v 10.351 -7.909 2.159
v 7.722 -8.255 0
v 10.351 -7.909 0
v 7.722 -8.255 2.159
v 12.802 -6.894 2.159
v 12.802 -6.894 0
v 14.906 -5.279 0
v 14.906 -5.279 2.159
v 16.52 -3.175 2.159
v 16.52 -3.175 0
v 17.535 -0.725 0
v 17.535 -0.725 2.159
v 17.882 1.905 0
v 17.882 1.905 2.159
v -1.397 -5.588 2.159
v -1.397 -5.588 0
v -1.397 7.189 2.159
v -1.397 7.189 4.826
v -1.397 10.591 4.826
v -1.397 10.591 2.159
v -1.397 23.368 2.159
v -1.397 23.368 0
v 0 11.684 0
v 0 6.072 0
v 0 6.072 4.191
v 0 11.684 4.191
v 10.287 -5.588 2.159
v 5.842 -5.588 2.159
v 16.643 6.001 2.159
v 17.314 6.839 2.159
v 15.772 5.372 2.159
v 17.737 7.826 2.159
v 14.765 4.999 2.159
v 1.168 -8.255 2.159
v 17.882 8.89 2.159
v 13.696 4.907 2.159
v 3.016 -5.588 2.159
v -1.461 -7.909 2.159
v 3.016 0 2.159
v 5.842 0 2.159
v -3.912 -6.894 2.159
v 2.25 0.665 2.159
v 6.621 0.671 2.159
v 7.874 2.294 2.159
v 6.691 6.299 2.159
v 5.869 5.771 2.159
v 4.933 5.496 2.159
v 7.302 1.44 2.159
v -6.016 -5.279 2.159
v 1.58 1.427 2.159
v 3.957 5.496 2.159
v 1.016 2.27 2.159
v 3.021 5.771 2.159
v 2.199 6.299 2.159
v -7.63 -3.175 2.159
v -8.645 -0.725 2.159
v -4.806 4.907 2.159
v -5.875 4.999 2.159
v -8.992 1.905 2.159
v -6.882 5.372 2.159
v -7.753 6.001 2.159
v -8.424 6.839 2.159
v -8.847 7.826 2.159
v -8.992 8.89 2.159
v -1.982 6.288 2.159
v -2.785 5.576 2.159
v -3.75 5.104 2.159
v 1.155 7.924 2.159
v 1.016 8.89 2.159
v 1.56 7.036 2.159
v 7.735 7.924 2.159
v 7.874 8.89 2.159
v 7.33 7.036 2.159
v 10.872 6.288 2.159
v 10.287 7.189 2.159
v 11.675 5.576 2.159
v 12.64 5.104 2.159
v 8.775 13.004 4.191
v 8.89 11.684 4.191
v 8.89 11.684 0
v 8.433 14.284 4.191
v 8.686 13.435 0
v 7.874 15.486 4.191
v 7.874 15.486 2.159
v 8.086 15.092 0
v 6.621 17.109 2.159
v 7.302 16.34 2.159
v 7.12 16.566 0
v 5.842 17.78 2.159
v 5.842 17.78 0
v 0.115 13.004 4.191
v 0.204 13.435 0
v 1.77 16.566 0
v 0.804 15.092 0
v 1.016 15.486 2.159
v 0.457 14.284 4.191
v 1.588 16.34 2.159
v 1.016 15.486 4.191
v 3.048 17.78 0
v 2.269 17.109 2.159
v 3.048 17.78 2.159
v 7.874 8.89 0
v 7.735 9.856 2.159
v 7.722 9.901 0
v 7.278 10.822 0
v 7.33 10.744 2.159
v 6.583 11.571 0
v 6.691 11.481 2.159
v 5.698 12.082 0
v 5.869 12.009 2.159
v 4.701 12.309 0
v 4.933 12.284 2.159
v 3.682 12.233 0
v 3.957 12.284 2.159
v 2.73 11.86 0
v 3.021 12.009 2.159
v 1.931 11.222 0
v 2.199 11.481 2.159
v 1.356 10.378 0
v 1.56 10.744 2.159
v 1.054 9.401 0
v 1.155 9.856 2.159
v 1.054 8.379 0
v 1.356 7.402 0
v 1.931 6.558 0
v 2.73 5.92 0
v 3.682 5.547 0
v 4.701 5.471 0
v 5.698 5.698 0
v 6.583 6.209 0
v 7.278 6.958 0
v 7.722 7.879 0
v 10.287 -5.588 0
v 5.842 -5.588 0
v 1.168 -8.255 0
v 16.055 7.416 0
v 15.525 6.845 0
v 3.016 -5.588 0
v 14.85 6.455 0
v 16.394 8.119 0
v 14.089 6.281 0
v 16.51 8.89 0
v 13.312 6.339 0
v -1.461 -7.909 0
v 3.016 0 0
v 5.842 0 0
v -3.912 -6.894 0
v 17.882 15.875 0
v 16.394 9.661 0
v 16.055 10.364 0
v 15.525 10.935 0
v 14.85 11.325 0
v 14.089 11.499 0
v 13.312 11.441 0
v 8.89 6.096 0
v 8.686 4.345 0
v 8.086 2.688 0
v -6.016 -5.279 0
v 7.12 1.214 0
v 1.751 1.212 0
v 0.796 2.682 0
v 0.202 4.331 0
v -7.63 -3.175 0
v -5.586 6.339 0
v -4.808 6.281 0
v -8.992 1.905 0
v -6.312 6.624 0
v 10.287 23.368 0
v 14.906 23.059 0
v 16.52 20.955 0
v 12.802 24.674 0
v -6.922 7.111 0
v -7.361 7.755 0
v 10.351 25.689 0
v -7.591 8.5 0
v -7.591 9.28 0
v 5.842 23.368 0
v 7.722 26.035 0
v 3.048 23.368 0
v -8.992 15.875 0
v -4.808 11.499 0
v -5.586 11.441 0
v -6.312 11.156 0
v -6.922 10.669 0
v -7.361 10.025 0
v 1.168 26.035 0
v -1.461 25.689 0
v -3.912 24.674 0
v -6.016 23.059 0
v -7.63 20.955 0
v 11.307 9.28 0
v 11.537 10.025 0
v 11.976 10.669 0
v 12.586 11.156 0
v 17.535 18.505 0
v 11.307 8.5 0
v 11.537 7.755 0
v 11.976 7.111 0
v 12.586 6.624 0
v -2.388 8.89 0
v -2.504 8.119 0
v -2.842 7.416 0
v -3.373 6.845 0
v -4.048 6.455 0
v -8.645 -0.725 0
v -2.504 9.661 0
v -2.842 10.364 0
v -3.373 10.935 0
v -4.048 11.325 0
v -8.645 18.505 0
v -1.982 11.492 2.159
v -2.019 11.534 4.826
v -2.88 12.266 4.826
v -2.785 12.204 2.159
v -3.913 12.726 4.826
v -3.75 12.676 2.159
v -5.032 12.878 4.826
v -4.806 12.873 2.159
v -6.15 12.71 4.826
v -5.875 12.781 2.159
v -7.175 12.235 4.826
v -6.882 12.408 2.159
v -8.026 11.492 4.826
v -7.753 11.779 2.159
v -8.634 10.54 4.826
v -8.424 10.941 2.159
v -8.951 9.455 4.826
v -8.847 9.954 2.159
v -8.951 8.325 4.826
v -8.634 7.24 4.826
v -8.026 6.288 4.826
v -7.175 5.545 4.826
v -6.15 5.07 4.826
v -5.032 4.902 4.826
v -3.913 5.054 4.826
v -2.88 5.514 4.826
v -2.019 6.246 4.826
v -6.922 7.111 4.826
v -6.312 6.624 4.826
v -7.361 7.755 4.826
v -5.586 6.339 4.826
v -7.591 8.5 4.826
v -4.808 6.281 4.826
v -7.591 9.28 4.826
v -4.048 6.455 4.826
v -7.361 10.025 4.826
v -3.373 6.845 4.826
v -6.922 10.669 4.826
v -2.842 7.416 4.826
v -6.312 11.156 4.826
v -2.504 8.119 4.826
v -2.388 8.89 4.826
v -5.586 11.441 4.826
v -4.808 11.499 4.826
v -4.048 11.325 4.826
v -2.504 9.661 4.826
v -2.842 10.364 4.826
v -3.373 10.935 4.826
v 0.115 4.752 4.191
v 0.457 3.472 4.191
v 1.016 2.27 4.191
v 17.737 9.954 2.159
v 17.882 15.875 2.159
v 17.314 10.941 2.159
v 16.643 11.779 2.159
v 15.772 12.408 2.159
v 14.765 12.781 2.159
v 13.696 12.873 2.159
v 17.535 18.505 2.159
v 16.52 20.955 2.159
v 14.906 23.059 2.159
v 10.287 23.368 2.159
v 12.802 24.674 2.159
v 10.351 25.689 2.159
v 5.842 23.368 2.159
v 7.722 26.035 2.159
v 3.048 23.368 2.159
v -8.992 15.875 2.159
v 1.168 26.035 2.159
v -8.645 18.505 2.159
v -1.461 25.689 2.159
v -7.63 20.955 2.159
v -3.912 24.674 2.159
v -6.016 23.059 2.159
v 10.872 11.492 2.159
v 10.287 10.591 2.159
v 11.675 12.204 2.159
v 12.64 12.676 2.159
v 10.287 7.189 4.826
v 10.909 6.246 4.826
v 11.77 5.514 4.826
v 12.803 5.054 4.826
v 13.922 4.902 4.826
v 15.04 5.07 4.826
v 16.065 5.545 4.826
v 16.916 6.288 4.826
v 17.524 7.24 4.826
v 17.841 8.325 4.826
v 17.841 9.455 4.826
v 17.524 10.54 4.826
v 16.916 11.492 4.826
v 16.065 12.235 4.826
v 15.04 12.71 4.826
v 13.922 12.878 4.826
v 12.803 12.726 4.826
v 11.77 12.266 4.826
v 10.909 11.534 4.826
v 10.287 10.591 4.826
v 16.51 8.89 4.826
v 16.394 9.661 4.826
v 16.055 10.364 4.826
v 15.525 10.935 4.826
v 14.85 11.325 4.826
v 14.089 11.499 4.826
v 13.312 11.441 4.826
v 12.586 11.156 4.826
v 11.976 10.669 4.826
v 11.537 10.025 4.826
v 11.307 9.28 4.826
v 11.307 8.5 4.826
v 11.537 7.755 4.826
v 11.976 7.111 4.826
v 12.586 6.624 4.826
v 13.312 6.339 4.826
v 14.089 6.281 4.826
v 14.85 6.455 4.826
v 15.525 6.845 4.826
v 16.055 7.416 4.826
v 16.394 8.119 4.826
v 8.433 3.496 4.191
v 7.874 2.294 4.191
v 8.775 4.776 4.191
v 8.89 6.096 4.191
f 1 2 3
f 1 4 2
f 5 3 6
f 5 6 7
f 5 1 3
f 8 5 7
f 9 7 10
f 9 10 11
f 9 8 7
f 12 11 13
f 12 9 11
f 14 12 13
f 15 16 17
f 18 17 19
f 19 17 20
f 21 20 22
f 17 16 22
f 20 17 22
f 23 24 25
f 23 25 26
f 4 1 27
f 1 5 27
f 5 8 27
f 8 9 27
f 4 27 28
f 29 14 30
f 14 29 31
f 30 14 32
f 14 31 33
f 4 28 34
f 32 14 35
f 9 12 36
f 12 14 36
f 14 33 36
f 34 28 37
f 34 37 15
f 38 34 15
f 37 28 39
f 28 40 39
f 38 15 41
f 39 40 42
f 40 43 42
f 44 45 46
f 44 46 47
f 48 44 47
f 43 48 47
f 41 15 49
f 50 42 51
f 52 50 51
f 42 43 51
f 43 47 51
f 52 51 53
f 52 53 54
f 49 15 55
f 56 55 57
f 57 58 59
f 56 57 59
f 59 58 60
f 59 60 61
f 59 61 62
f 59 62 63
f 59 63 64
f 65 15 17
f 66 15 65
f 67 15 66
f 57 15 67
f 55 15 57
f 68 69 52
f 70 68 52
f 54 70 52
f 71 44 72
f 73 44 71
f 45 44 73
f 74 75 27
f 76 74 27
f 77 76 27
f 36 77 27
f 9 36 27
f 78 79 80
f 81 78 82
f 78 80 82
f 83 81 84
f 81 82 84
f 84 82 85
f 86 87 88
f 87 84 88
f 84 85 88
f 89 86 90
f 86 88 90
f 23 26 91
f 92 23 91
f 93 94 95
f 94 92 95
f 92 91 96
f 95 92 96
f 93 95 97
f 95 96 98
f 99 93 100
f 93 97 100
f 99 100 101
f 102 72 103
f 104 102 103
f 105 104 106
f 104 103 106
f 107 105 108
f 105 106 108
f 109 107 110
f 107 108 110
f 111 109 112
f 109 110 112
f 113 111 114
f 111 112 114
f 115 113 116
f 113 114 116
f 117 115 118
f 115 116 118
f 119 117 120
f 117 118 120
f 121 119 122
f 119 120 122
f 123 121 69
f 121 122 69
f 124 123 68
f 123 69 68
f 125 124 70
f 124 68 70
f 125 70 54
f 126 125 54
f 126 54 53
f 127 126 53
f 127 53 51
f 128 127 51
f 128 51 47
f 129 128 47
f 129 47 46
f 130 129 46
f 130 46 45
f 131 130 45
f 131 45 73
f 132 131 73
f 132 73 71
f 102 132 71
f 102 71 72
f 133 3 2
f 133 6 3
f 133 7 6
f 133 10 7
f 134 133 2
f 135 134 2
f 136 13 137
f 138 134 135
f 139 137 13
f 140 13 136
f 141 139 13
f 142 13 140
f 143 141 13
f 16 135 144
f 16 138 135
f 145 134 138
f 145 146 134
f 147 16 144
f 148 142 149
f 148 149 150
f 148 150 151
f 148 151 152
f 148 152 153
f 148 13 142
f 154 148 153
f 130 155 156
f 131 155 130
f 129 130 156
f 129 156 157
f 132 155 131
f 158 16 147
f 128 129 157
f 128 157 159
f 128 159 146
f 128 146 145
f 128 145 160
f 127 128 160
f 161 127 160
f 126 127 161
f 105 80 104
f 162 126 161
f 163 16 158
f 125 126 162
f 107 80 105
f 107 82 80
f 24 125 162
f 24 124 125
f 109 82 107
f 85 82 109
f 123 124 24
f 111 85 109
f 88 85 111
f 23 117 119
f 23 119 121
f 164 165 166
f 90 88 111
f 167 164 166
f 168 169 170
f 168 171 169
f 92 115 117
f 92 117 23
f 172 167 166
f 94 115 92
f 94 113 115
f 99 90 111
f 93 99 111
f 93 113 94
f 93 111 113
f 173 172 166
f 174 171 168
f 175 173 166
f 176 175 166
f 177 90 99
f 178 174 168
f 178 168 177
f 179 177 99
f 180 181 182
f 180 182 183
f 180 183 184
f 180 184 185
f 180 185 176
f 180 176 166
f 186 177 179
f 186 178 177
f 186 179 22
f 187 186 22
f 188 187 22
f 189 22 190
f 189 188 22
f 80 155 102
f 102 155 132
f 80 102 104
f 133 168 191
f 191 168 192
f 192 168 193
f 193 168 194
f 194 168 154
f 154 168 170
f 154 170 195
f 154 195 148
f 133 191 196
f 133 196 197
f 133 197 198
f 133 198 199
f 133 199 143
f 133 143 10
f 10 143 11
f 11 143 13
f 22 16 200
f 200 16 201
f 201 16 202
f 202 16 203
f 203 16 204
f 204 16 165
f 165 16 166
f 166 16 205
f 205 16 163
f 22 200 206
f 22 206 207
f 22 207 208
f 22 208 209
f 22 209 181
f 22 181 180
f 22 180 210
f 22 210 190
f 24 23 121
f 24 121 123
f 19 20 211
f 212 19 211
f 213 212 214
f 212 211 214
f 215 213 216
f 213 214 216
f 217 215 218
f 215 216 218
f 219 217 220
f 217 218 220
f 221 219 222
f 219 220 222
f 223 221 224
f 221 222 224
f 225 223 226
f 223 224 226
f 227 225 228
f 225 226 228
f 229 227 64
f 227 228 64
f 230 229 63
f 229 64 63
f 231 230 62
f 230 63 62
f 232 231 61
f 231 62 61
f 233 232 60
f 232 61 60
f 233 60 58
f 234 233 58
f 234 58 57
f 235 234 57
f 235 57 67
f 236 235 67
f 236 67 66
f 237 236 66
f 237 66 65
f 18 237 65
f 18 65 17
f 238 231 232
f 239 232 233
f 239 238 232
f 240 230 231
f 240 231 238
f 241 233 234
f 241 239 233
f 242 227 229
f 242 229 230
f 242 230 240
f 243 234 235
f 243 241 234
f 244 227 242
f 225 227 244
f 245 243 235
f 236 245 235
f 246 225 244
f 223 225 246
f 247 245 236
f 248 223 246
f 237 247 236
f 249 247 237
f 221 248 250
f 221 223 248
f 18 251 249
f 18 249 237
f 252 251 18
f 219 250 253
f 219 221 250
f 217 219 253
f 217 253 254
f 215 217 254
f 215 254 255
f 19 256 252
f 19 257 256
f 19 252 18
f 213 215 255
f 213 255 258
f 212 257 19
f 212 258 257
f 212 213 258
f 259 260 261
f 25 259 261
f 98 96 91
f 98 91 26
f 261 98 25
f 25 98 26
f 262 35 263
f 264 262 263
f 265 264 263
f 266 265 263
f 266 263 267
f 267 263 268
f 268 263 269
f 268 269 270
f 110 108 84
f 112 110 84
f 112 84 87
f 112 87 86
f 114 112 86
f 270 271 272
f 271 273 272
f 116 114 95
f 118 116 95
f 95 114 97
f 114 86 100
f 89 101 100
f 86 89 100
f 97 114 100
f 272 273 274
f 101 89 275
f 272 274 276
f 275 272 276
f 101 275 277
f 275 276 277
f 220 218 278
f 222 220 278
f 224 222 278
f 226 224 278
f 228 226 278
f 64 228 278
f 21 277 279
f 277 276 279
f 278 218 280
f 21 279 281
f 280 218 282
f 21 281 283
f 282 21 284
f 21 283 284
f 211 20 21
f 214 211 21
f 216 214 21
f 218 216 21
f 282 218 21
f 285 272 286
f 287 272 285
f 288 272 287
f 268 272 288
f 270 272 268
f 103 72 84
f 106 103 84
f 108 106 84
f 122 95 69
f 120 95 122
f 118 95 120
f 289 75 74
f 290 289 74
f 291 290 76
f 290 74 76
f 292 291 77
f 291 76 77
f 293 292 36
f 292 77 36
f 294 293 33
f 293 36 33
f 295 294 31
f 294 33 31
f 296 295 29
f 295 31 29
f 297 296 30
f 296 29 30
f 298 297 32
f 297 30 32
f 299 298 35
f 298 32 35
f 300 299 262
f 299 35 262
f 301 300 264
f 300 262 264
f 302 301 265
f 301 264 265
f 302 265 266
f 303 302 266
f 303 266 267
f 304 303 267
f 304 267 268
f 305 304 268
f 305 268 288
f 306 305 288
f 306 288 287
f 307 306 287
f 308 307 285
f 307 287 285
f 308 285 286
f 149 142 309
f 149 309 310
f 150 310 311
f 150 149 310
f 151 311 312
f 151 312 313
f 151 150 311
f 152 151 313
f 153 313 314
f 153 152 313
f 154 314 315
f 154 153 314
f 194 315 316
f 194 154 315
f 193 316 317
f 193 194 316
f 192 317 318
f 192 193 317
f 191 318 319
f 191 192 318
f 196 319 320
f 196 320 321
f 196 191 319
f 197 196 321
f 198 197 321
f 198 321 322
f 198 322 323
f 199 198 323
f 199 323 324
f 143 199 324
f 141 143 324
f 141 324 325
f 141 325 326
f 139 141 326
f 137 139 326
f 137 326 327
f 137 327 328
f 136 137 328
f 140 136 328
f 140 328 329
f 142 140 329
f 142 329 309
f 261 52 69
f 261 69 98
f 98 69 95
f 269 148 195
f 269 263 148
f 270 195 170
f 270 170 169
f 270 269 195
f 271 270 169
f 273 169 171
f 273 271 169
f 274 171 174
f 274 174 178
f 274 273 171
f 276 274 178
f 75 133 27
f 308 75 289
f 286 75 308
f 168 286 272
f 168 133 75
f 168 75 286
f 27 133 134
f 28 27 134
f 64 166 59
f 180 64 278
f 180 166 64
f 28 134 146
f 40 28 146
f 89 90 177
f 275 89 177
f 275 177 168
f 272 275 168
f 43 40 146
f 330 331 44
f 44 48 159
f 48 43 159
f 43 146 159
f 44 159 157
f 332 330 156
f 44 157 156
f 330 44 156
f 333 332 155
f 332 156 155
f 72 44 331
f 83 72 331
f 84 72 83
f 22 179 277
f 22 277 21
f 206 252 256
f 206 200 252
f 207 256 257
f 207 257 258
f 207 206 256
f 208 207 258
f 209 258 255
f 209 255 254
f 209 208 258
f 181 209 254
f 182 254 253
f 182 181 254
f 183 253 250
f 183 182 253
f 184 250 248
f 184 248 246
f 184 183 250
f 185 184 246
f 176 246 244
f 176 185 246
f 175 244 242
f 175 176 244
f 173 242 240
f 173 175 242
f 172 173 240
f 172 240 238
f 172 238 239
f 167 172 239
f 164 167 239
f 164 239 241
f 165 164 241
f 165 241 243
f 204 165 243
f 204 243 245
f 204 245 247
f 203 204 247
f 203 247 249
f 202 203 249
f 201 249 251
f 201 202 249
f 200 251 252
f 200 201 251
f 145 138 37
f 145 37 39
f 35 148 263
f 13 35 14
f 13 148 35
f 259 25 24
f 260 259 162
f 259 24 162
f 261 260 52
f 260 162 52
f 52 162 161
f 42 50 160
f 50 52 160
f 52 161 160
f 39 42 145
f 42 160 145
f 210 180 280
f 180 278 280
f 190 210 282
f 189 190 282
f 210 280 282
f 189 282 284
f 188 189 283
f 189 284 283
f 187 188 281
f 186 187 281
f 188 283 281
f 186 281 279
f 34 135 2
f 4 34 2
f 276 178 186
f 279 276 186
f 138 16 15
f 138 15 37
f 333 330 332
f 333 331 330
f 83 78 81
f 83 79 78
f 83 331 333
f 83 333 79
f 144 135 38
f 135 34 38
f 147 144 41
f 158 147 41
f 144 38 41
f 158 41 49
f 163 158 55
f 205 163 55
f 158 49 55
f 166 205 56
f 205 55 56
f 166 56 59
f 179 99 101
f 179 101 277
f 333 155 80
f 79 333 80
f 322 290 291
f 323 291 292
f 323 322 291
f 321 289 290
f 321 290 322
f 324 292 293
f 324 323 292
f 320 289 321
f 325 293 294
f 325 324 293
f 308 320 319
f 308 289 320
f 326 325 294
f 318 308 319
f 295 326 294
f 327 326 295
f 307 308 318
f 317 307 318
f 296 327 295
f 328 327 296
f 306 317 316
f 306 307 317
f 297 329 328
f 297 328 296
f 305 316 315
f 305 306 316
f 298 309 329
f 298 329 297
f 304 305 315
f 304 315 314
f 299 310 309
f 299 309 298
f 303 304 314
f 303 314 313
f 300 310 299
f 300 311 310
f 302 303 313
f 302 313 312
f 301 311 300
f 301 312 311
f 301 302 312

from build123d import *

# Parameters (mm, degrees)
SKETCH1_R           = 2.6162
BOSS_EXTRUDE1_DEPTH = 2.159
SKETCH2_R           = 3.429
CUT_EXTRUDE1_DEPTH  = 32.658081505
FILLET1_R           = 10.16
SKETCH3_W           = 1.016
SKETCH3_H           = 17.78
BOSS_EXTRUDE2_DEPTH = 2.032
SKETCH4_R           = 3.9878
SKETCH4_R_2         = 2.6162
BOSS_EXTRUDE3_DEPTH = 2.667
FILLET2_R           = 7.62
SKETCH6_W           = 0.381
SKETCH6_H           = 28.956
CUT_EXTRUDE2_DEPTH  = 32.950948649


with BuildPart() as part:
    # Sketch1 → Boss-Extrude1 (new body)
    with BuildSketch(Plane.XY):
        Polygon((-1.016, -8.255), (-8.9916, -8.255), (-8.9916, 26.035), (-1.016, 26.035), (9.906, 26.035), (17.8816, 26.035), (17.8816, -8.255), (9.906, -8.255), align=None)
        with Locations((13.8938, 8.89)):
            Circle(SKETCH1_R, mode=Mode.SUBTRACT)
        with Locations((-5.0038, 8.89)):
            Circle(SKETCH1_R, mode=Mode.SUBTRACT)
        Polygon((0, 0), (0, 17.78), (3.048, 17.78), (3.048, 23.368), (-1.016, 23.368), (-1.016, 18.288), (-1.016, 0.508), (-1.016, -5.588), (3.016124998, -5.588), (3.016124998, 0), align=None, mode=Mode.SUBTRACT)
        Polygon((8.89, 0), (8.89, 17.78), (5.842, 17.78), (5.842, 23.368), (9.906, 23.368), (9.906, 17.78), (9.906, 0), (9.906, -5.588), (5.842, -5.588), (5.842, 0), align=None, mode=Mode.SUBTRACT)
    extrude(amount=BOSS_EXTRUDE1_DEPTH)

    # Sketch2 → Cut-Extrude1 (cut, through all)
    with BuildSketch(Plane.XY.offset(2.159)):
        with Locations((4.445, 8.89)):
            Circle(SKETCH2_R)
    extrude(amount=-CUT_EXTRUDE1_DEPTH, mode=Mode.SUBTRACT)

    # Fillet1
    fillet1_edges = [part.edges().sort_by_distance(p)[0] for p in [
        (17.8816, -8.255, 1.0795),
        (-8.9916, -8.255, 1.0795),
        (-8.9916, 26.035, 1.0795),
        (17.8816, 26.035, 1.0795),
    ]]
    fillet(fillet1_edges, radius=FILLET1_R)

    # Sketch3 → Boss-Extrude2 (add)
    with BuildSketch(Plane.XY.offset(2.159)):
        with Locations((0.508, 8.89)):
            Rectangle(SKETCH3_W, SKETCH3_H)
        with Locations((8.382, 8.89)):
            Rectangle(SKETCH3_W, SKETCH3_H)
    extrude(amount=BOSS_EXTRUDE2_DEPTH)

    # Sketch4 → Boss-Extrude3 (add)
    # profile 1 of 2: a face of its own
    with BuildSketch(Plane.XY.offset(2.159)):
        with Locations((-5.0038, 8.89)):
            Circle(SKETCH4_R)
        with Locations((-5.0038, 8.89)):
            Circle(SKETCH4_R_2, mode=Mode.SUBTRACT)
    # profile 2 of 2: a face of its own
    with BuildSketch(Plane.XY.offset(2.159)):
        with Locations((13.8938, 8.89)):
            Circle(SKETCH4_R)
        with Locations((13.8938, 8.89)):
            Circle(SKETCH4_R_2, mode=Mode.SUBTRACT)
    extrude(amount=BOSS_EXTRUDE3_DEPTH)

    # Fillet2
    # the kernel refuses this fillet: 7.62 mm, written as the material it takes off along each edge
    with BuildSketch(Plane(origin=(8.89, 0, -15.24), x_dir=(0, 1, 0), z_dir=(0, 0, 1))) as fillet2_piece_1:
        with BuildLine():
            CenterArc((6.096, 7.62), FILLET2_R, 216.869897646, 53.130102354)
            Line((0, 3.048), (-0.12192, 2.95656))
            ThreePointArc((-0.12192, 2.95656), (-0.1524, 1.524), (-0.1524, 0))
            Line((-0.1524, 0), (0, -0.1524))
            Line((0, -0.1524), (6.096, -0.1524))
            Line((6.096, -0.1524), (6.096, 0))
        make_face()
    extrude(amount=34.671, mode=Mode.SUBTRACT)
    with BuildSketch(Plane(origin=(0, 0, -15.17990756), x_dir=(0, 1, 0), z_dir=(0, 0, 1))) as fillet2_piece_2:
        with BuildLine():
            CenterArc((6.071963024, -7.62), FILLET2_R, 90, 52.82992082)
            Line((0, -3.016124998), (-0.12143926, -2.924047498))
            ThreePointArc((-0.12143926, -2.924047498), (-0.1524, -1.508062499), (-0.1524, 0))
            Line((-0.1524, 0), (0, 0.1524))
            Line((0, 0.1524), (6.071963024, 0.1524))
            Line((6.071963024, 0.1524), (6.071963024, 0))
        make_face()
    extrude(amount=34.550815121, mode=Mode.SUBTRACT)
    with BuildSketch(Plane(origin=(0, 17.78, 19.431), x_dir=(1, 0, 0), z_dir=(0, 0, -1)), Plane(origin=(8.89, 17.78, -15.24), x_dir=(-1, 0, 0), z_dir=(0, 0, 1))) as fillet2_piece_3:
        with BuildLine():
            CenterArc((7.62, 6.096), FILLET2_R, 180, 53.130102354)
            Line((0, 6.096), (-0.1524, 6.096))
            Line((-0.1524, 6.096), (-0.1524, 0))
            Line((-0.1524, 0), (0, -0.1524))
            ThreePointArc((0, -0.1524), (1.524, -0.1524), (2.95656, -0.12192))
            Line((2.95656, -0.12192), (3.048, 0))
        make_face()
    extrude(amount=34.671, mode=Mode.SUBTRACT)

    # Sketch6 → Cut-Extrude2 (cut, through all)
    with BuildSketch(Plane(origin=(0, 0, 0), x_dir=(-1, 0, 0), z_dir=(0, 0, -1))):
        with Locations((1.2065, 8.89)):
            Rectangle(SKETCH6_W, SKETCH6_H)
        with Locations((-10.0965, 8.89)):
            Rectangle(SKETCH6_W, SKETCH6_H)
    extrude(amount=-CUT_EXTRUDE2_DEPTH, mode=Mode.SUBTRACT)


solid = part.part
